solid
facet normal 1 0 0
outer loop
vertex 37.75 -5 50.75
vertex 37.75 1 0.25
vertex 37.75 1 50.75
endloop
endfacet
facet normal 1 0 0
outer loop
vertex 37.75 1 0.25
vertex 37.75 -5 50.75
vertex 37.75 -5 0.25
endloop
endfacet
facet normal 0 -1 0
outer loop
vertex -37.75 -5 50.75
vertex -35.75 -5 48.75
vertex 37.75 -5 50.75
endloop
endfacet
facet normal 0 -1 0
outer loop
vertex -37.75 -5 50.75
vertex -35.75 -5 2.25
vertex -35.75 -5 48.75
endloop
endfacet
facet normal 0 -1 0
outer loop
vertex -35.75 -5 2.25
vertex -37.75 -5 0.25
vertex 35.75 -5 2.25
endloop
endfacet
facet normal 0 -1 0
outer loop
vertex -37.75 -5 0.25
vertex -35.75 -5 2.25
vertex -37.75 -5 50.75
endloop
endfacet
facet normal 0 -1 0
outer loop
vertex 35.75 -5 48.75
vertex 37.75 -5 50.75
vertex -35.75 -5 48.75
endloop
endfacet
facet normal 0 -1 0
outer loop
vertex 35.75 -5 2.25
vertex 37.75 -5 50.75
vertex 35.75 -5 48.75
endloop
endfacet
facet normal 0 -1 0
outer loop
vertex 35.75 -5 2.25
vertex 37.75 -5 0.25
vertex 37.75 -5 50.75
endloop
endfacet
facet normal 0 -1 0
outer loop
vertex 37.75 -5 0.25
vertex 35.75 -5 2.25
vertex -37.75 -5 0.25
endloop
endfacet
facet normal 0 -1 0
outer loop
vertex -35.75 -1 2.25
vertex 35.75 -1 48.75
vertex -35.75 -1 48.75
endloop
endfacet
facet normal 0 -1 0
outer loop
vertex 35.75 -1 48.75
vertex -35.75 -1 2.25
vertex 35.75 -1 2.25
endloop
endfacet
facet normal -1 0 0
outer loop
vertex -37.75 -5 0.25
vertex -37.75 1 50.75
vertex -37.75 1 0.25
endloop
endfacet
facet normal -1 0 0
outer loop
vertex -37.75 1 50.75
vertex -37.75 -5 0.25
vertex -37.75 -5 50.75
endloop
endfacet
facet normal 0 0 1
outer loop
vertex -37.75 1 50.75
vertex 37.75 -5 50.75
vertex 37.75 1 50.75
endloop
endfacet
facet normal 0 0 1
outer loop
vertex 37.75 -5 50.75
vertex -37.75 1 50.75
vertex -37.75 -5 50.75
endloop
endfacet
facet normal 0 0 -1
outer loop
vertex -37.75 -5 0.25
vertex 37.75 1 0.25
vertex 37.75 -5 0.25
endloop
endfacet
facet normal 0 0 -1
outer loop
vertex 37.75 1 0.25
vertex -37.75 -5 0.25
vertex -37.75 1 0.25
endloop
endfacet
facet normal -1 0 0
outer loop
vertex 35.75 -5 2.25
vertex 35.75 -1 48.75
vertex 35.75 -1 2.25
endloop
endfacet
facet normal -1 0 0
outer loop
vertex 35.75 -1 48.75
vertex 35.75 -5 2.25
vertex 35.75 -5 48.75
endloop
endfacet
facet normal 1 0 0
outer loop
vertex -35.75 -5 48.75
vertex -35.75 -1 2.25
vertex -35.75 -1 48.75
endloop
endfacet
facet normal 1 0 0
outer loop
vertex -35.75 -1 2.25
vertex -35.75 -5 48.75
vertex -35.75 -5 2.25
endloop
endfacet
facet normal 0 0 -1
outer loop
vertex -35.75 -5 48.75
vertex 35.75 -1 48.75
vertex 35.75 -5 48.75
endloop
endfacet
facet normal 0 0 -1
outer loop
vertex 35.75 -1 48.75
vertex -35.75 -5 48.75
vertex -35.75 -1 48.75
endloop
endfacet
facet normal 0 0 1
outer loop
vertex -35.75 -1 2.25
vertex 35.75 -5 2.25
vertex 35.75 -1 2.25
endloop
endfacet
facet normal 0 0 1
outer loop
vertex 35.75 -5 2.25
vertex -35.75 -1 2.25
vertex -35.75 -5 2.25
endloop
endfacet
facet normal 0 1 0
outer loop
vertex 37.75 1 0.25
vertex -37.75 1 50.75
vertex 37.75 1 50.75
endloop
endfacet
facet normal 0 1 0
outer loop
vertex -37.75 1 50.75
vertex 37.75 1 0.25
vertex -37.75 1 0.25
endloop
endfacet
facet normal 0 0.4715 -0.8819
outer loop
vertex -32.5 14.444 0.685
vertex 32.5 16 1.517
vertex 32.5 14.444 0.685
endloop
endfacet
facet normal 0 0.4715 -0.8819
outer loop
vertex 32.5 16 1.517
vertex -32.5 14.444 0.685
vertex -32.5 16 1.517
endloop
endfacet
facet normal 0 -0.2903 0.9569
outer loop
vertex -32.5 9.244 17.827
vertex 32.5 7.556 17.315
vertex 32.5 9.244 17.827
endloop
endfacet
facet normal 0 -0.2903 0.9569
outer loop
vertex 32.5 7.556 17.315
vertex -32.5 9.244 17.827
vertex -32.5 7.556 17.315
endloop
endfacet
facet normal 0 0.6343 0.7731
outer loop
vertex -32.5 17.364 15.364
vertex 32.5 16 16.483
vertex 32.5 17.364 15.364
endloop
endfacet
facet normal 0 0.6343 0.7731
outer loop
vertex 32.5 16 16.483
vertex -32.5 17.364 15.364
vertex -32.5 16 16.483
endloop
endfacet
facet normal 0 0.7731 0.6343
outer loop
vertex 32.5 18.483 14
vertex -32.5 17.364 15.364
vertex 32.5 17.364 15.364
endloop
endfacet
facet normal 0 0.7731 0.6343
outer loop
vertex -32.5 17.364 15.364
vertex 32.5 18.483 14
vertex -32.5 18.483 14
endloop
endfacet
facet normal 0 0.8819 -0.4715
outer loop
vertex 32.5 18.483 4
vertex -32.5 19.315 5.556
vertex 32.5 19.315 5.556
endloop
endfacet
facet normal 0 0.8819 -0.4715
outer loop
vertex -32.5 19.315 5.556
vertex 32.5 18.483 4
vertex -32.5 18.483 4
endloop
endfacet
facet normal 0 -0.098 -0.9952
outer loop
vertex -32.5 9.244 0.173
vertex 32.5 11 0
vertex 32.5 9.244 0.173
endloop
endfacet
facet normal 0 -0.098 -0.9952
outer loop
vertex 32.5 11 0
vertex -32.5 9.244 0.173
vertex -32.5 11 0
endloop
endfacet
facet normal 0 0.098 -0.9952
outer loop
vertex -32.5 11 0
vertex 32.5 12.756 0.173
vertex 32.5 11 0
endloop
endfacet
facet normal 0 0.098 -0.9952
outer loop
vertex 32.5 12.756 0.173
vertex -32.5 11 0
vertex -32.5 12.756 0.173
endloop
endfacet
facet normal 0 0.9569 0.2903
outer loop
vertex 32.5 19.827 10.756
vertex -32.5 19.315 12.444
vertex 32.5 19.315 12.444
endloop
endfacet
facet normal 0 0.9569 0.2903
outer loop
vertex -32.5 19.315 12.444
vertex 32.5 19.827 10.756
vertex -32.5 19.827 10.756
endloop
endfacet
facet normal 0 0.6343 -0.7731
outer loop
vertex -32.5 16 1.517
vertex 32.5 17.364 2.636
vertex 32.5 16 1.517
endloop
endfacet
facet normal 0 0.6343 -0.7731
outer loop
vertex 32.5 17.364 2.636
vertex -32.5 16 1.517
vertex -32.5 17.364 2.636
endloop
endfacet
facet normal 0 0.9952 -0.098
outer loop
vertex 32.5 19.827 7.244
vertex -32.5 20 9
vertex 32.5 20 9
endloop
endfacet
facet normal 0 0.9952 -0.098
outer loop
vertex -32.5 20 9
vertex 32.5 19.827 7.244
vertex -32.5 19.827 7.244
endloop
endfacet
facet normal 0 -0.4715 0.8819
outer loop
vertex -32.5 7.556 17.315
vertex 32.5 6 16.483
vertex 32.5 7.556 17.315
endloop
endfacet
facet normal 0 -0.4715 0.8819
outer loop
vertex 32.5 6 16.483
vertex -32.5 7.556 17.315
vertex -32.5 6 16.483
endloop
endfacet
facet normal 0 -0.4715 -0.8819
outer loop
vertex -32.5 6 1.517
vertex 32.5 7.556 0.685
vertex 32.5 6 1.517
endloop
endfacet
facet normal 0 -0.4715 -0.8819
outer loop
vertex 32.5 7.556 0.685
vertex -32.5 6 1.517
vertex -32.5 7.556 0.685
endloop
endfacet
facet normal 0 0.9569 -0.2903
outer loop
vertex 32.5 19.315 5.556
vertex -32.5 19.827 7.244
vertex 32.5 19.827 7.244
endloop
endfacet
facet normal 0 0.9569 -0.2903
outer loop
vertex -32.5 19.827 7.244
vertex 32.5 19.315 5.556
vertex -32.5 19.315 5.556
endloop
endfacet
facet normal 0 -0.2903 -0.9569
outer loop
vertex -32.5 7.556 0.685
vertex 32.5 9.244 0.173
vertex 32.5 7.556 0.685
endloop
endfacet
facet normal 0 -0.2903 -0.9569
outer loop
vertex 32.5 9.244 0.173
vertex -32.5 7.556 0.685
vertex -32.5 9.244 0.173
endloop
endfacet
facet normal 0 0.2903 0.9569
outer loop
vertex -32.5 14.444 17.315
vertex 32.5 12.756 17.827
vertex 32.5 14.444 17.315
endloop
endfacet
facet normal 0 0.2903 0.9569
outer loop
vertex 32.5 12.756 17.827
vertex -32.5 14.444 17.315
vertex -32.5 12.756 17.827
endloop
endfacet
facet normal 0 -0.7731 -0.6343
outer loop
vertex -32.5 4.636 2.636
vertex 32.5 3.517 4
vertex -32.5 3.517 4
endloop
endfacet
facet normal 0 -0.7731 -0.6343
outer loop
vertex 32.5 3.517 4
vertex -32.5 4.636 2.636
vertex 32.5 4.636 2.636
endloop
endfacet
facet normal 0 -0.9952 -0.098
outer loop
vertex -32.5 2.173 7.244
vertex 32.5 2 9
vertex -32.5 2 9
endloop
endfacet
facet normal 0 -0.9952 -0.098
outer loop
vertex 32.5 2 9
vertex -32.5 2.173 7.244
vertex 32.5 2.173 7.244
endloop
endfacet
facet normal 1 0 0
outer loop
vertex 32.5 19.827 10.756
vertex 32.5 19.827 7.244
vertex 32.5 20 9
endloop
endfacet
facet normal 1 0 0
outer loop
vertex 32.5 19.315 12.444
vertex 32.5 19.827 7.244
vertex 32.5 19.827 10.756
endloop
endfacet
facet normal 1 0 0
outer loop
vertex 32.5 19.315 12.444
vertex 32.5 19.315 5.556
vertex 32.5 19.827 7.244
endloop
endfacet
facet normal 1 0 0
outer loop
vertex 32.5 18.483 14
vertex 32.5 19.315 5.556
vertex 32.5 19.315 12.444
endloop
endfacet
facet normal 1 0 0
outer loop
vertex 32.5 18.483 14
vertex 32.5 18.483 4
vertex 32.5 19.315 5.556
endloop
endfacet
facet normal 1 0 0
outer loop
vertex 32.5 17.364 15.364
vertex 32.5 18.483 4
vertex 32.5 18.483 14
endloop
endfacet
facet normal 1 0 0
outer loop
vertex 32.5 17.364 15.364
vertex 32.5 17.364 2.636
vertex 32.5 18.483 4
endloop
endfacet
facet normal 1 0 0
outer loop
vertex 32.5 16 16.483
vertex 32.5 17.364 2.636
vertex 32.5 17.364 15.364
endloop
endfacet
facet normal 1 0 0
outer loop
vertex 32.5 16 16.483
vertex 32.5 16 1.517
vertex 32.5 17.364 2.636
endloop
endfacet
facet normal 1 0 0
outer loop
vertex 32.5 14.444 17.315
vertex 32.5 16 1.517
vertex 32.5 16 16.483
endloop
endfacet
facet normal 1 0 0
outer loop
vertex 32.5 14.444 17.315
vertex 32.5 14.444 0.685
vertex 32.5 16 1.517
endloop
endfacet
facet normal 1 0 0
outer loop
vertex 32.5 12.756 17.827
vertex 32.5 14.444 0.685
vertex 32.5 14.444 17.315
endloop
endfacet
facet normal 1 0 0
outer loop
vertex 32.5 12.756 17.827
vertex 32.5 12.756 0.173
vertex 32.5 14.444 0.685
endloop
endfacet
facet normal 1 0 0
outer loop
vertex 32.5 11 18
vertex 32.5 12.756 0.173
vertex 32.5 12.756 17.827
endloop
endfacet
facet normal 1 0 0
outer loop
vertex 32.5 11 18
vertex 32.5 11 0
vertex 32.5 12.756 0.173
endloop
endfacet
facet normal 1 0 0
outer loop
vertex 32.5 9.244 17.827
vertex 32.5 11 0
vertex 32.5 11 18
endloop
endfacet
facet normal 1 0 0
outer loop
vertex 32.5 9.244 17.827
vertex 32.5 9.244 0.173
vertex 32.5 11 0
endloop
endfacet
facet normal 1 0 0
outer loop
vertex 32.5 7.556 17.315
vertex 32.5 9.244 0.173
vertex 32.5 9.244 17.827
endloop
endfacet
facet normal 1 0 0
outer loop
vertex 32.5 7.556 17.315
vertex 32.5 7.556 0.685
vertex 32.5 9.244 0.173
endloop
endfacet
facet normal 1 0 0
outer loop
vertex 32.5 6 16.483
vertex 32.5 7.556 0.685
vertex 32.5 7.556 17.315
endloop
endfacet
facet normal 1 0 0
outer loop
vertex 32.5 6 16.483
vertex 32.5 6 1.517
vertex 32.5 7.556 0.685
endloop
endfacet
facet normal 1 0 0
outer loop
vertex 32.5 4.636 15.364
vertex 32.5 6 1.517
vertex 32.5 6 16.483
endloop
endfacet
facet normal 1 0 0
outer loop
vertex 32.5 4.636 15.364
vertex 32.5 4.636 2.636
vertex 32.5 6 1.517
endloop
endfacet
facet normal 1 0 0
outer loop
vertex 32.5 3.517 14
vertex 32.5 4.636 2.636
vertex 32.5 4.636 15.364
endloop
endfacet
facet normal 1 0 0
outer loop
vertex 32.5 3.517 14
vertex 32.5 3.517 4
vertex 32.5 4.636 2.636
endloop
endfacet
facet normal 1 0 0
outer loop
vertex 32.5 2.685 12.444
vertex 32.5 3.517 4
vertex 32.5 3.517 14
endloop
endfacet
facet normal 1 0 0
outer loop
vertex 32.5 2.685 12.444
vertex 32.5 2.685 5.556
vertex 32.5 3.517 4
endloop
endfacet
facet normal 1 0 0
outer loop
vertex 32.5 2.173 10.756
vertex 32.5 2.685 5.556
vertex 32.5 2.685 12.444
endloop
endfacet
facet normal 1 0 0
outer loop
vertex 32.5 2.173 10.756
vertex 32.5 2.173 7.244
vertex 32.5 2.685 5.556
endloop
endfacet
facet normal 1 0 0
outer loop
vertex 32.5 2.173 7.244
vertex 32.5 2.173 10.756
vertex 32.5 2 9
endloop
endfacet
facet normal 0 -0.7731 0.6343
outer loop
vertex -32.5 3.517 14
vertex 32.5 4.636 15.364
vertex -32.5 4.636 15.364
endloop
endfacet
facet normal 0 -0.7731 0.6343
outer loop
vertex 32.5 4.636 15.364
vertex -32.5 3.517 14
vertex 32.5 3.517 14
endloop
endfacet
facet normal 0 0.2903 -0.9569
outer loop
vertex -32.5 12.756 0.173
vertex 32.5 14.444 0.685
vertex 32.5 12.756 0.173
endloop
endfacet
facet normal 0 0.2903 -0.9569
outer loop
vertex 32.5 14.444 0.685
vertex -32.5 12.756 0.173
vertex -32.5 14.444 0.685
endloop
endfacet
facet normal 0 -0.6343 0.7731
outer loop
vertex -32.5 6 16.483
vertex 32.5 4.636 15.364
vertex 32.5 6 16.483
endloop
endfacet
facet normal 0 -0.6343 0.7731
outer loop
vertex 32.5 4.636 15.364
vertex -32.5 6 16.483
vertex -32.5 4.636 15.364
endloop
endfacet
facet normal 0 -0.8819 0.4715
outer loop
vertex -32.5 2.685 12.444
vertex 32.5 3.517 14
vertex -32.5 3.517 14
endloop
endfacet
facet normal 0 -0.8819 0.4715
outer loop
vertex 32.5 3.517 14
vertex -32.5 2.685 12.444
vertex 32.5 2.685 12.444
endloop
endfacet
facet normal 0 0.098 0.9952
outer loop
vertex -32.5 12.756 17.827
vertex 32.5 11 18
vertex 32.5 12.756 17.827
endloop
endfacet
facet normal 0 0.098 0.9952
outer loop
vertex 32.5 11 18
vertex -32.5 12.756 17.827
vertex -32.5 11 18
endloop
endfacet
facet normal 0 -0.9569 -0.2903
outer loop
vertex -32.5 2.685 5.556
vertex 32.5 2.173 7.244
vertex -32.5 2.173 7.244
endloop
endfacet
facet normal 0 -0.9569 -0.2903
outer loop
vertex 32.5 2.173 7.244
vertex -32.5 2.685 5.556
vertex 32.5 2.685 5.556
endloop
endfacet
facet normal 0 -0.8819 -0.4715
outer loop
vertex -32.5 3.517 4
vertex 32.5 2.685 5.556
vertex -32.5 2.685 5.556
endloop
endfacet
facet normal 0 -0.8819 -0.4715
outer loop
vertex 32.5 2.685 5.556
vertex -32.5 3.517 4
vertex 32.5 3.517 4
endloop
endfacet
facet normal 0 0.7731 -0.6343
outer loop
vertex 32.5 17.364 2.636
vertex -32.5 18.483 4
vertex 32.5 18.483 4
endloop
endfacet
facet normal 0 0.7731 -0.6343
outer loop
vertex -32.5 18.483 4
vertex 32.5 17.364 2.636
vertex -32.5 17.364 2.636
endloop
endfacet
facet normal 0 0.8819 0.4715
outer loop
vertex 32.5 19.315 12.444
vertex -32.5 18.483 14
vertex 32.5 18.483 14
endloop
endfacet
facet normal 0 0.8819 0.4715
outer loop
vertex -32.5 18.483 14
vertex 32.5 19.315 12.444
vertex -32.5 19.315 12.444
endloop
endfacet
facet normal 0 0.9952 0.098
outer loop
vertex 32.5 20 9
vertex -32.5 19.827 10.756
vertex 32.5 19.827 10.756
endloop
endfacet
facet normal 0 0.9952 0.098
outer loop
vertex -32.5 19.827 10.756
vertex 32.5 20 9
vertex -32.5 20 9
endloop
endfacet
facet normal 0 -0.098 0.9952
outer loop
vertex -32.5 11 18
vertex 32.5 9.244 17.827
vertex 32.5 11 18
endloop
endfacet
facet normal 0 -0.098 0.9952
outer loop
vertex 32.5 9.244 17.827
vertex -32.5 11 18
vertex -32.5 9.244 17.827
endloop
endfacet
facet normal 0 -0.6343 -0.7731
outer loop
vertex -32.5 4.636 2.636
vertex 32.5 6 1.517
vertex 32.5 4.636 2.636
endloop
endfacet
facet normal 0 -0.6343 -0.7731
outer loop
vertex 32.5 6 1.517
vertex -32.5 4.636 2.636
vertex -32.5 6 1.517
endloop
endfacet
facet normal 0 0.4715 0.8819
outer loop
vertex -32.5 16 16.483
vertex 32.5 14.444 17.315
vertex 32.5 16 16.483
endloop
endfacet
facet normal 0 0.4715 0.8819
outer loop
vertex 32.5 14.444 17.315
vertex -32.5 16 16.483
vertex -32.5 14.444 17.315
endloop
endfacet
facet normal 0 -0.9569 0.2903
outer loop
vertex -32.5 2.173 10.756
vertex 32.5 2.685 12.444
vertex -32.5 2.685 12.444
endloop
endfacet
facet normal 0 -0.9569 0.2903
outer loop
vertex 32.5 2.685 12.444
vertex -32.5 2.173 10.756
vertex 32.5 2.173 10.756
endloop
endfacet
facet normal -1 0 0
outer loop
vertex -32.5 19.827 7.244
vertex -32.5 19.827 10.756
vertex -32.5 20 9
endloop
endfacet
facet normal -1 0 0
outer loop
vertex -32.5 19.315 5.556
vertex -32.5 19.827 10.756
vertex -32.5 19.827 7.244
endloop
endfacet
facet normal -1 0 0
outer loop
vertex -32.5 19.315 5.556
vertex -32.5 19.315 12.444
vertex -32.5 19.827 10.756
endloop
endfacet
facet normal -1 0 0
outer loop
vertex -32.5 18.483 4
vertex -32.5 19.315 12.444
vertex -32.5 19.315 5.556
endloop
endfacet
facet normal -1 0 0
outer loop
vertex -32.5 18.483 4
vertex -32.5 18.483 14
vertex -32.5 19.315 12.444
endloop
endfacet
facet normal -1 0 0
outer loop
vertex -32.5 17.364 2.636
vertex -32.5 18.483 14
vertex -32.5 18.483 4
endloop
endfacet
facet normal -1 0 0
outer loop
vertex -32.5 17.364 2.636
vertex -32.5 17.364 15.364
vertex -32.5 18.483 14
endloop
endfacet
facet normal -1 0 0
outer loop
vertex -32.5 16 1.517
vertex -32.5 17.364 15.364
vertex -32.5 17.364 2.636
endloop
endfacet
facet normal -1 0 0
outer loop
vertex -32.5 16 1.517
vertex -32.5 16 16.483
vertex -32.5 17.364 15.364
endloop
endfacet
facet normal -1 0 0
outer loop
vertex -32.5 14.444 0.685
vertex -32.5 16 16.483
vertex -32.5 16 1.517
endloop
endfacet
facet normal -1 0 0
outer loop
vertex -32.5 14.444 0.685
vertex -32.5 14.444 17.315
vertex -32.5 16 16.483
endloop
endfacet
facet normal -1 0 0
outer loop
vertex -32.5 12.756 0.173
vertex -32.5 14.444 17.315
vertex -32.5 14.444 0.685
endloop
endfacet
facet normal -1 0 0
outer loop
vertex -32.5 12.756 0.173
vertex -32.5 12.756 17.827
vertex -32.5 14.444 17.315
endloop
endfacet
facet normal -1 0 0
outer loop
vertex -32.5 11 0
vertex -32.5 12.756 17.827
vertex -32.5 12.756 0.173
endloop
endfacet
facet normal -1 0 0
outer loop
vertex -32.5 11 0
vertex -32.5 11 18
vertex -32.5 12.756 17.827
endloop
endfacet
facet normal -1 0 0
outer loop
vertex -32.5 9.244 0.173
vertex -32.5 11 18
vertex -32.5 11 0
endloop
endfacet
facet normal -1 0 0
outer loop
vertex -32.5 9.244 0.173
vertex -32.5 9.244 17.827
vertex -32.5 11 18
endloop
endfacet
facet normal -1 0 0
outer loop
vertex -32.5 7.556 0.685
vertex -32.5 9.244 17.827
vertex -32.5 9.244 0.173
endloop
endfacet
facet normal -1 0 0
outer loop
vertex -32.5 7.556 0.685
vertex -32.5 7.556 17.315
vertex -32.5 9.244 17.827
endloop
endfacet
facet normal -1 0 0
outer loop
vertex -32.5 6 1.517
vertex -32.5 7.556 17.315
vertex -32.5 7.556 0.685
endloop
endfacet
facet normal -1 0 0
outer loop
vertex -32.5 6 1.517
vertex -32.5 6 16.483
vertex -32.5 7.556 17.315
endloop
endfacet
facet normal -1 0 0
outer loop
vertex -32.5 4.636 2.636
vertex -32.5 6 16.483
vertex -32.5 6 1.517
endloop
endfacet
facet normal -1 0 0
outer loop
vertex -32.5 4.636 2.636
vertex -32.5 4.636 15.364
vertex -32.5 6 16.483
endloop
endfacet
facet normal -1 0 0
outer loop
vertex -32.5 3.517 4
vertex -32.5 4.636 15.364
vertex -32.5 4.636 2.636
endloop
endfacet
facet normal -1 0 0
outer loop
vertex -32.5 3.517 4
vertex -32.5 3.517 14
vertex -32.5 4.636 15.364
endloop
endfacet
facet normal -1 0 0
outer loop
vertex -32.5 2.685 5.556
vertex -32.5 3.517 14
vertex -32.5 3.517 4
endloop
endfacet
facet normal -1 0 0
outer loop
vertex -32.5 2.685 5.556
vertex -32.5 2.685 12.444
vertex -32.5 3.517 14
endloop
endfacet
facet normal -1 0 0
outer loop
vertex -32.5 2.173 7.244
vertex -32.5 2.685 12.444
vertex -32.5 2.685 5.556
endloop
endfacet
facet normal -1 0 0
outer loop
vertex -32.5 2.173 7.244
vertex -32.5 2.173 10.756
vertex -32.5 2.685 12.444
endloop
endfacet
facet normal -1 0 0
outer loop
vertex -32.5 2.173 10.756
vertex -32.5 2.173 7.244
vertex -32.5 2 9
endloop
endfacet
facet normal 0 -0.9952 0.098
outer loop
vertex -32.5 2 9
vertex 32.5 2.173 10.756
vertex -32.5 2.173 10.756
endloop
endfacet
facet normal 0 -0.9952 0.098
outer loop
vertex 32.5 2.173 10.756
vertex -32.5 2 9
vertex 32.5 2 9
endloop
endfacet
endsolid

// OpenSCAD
// file: akkum_18650.scad
echo("Работа Асыловой Анастасии");

d_akkum = 18;
h_akkum = 65;

akkum18650();

module akkum18650(){
    color("purple")
    cylinder(d=d_akkum, h=h_akkum, $fn=32, center = true);
}
// file: frame.scad
use <akkum_18650.scad>

echo("Работа Асыловой Анастасии!");
thickness_frame = 4;
thickness_walls = 2;
thickness_bottom = 2;

w_back = 70;
h_back = 45;
thickness_back = 1;
h_walls = 4;

d_akkum = 18;
h_akkum = 65;

gap_backlight = 1.5;

module kit_frame(){
    bottom();
    translate([0,0,h_walls/2+thickness_bottom/2])
    walls();
}
module walls(){
    difference(){
        cube([w_back+2*thickness_walls+gap_backlight, h_back+2*thickness_walls+gap_backlight, h_walls], center = true);
        color("red")
        cube([w_back+gap_backlight, h_back+gap_backlight, h_walls+1], center = true);
    }
}
module backlight(){
    color("lightgreen")
    cube([w_back, h_back, thickness_back], center = true);
}

module bottom(){
    cube([w_back+2*thickness_walls+gap_backlight, h_back+2*thickness_walls+gap_backlight, thickness_bottom], center = true);
}
// main file
use <frame.scad>
use <akkum_18650.scad>

echo("Работа Асыловой Анастасии!");

h_back = 45;
d_akkum = 18;
h_akkum = 65;
gap_backlight = 1.5;
thickness_bottom = 2;

build_frame();

module build_frame(){
    translate([0, 0, h_back/2+2*gap_backlight])
    rotate([90,0,0])
    kit_frame();
    translate([0,0,d_akkum/2])
    translate([0,d_akkum/2+thickness_bottom,0])
    rotate([0,90,0])
    akkum18650();
}
